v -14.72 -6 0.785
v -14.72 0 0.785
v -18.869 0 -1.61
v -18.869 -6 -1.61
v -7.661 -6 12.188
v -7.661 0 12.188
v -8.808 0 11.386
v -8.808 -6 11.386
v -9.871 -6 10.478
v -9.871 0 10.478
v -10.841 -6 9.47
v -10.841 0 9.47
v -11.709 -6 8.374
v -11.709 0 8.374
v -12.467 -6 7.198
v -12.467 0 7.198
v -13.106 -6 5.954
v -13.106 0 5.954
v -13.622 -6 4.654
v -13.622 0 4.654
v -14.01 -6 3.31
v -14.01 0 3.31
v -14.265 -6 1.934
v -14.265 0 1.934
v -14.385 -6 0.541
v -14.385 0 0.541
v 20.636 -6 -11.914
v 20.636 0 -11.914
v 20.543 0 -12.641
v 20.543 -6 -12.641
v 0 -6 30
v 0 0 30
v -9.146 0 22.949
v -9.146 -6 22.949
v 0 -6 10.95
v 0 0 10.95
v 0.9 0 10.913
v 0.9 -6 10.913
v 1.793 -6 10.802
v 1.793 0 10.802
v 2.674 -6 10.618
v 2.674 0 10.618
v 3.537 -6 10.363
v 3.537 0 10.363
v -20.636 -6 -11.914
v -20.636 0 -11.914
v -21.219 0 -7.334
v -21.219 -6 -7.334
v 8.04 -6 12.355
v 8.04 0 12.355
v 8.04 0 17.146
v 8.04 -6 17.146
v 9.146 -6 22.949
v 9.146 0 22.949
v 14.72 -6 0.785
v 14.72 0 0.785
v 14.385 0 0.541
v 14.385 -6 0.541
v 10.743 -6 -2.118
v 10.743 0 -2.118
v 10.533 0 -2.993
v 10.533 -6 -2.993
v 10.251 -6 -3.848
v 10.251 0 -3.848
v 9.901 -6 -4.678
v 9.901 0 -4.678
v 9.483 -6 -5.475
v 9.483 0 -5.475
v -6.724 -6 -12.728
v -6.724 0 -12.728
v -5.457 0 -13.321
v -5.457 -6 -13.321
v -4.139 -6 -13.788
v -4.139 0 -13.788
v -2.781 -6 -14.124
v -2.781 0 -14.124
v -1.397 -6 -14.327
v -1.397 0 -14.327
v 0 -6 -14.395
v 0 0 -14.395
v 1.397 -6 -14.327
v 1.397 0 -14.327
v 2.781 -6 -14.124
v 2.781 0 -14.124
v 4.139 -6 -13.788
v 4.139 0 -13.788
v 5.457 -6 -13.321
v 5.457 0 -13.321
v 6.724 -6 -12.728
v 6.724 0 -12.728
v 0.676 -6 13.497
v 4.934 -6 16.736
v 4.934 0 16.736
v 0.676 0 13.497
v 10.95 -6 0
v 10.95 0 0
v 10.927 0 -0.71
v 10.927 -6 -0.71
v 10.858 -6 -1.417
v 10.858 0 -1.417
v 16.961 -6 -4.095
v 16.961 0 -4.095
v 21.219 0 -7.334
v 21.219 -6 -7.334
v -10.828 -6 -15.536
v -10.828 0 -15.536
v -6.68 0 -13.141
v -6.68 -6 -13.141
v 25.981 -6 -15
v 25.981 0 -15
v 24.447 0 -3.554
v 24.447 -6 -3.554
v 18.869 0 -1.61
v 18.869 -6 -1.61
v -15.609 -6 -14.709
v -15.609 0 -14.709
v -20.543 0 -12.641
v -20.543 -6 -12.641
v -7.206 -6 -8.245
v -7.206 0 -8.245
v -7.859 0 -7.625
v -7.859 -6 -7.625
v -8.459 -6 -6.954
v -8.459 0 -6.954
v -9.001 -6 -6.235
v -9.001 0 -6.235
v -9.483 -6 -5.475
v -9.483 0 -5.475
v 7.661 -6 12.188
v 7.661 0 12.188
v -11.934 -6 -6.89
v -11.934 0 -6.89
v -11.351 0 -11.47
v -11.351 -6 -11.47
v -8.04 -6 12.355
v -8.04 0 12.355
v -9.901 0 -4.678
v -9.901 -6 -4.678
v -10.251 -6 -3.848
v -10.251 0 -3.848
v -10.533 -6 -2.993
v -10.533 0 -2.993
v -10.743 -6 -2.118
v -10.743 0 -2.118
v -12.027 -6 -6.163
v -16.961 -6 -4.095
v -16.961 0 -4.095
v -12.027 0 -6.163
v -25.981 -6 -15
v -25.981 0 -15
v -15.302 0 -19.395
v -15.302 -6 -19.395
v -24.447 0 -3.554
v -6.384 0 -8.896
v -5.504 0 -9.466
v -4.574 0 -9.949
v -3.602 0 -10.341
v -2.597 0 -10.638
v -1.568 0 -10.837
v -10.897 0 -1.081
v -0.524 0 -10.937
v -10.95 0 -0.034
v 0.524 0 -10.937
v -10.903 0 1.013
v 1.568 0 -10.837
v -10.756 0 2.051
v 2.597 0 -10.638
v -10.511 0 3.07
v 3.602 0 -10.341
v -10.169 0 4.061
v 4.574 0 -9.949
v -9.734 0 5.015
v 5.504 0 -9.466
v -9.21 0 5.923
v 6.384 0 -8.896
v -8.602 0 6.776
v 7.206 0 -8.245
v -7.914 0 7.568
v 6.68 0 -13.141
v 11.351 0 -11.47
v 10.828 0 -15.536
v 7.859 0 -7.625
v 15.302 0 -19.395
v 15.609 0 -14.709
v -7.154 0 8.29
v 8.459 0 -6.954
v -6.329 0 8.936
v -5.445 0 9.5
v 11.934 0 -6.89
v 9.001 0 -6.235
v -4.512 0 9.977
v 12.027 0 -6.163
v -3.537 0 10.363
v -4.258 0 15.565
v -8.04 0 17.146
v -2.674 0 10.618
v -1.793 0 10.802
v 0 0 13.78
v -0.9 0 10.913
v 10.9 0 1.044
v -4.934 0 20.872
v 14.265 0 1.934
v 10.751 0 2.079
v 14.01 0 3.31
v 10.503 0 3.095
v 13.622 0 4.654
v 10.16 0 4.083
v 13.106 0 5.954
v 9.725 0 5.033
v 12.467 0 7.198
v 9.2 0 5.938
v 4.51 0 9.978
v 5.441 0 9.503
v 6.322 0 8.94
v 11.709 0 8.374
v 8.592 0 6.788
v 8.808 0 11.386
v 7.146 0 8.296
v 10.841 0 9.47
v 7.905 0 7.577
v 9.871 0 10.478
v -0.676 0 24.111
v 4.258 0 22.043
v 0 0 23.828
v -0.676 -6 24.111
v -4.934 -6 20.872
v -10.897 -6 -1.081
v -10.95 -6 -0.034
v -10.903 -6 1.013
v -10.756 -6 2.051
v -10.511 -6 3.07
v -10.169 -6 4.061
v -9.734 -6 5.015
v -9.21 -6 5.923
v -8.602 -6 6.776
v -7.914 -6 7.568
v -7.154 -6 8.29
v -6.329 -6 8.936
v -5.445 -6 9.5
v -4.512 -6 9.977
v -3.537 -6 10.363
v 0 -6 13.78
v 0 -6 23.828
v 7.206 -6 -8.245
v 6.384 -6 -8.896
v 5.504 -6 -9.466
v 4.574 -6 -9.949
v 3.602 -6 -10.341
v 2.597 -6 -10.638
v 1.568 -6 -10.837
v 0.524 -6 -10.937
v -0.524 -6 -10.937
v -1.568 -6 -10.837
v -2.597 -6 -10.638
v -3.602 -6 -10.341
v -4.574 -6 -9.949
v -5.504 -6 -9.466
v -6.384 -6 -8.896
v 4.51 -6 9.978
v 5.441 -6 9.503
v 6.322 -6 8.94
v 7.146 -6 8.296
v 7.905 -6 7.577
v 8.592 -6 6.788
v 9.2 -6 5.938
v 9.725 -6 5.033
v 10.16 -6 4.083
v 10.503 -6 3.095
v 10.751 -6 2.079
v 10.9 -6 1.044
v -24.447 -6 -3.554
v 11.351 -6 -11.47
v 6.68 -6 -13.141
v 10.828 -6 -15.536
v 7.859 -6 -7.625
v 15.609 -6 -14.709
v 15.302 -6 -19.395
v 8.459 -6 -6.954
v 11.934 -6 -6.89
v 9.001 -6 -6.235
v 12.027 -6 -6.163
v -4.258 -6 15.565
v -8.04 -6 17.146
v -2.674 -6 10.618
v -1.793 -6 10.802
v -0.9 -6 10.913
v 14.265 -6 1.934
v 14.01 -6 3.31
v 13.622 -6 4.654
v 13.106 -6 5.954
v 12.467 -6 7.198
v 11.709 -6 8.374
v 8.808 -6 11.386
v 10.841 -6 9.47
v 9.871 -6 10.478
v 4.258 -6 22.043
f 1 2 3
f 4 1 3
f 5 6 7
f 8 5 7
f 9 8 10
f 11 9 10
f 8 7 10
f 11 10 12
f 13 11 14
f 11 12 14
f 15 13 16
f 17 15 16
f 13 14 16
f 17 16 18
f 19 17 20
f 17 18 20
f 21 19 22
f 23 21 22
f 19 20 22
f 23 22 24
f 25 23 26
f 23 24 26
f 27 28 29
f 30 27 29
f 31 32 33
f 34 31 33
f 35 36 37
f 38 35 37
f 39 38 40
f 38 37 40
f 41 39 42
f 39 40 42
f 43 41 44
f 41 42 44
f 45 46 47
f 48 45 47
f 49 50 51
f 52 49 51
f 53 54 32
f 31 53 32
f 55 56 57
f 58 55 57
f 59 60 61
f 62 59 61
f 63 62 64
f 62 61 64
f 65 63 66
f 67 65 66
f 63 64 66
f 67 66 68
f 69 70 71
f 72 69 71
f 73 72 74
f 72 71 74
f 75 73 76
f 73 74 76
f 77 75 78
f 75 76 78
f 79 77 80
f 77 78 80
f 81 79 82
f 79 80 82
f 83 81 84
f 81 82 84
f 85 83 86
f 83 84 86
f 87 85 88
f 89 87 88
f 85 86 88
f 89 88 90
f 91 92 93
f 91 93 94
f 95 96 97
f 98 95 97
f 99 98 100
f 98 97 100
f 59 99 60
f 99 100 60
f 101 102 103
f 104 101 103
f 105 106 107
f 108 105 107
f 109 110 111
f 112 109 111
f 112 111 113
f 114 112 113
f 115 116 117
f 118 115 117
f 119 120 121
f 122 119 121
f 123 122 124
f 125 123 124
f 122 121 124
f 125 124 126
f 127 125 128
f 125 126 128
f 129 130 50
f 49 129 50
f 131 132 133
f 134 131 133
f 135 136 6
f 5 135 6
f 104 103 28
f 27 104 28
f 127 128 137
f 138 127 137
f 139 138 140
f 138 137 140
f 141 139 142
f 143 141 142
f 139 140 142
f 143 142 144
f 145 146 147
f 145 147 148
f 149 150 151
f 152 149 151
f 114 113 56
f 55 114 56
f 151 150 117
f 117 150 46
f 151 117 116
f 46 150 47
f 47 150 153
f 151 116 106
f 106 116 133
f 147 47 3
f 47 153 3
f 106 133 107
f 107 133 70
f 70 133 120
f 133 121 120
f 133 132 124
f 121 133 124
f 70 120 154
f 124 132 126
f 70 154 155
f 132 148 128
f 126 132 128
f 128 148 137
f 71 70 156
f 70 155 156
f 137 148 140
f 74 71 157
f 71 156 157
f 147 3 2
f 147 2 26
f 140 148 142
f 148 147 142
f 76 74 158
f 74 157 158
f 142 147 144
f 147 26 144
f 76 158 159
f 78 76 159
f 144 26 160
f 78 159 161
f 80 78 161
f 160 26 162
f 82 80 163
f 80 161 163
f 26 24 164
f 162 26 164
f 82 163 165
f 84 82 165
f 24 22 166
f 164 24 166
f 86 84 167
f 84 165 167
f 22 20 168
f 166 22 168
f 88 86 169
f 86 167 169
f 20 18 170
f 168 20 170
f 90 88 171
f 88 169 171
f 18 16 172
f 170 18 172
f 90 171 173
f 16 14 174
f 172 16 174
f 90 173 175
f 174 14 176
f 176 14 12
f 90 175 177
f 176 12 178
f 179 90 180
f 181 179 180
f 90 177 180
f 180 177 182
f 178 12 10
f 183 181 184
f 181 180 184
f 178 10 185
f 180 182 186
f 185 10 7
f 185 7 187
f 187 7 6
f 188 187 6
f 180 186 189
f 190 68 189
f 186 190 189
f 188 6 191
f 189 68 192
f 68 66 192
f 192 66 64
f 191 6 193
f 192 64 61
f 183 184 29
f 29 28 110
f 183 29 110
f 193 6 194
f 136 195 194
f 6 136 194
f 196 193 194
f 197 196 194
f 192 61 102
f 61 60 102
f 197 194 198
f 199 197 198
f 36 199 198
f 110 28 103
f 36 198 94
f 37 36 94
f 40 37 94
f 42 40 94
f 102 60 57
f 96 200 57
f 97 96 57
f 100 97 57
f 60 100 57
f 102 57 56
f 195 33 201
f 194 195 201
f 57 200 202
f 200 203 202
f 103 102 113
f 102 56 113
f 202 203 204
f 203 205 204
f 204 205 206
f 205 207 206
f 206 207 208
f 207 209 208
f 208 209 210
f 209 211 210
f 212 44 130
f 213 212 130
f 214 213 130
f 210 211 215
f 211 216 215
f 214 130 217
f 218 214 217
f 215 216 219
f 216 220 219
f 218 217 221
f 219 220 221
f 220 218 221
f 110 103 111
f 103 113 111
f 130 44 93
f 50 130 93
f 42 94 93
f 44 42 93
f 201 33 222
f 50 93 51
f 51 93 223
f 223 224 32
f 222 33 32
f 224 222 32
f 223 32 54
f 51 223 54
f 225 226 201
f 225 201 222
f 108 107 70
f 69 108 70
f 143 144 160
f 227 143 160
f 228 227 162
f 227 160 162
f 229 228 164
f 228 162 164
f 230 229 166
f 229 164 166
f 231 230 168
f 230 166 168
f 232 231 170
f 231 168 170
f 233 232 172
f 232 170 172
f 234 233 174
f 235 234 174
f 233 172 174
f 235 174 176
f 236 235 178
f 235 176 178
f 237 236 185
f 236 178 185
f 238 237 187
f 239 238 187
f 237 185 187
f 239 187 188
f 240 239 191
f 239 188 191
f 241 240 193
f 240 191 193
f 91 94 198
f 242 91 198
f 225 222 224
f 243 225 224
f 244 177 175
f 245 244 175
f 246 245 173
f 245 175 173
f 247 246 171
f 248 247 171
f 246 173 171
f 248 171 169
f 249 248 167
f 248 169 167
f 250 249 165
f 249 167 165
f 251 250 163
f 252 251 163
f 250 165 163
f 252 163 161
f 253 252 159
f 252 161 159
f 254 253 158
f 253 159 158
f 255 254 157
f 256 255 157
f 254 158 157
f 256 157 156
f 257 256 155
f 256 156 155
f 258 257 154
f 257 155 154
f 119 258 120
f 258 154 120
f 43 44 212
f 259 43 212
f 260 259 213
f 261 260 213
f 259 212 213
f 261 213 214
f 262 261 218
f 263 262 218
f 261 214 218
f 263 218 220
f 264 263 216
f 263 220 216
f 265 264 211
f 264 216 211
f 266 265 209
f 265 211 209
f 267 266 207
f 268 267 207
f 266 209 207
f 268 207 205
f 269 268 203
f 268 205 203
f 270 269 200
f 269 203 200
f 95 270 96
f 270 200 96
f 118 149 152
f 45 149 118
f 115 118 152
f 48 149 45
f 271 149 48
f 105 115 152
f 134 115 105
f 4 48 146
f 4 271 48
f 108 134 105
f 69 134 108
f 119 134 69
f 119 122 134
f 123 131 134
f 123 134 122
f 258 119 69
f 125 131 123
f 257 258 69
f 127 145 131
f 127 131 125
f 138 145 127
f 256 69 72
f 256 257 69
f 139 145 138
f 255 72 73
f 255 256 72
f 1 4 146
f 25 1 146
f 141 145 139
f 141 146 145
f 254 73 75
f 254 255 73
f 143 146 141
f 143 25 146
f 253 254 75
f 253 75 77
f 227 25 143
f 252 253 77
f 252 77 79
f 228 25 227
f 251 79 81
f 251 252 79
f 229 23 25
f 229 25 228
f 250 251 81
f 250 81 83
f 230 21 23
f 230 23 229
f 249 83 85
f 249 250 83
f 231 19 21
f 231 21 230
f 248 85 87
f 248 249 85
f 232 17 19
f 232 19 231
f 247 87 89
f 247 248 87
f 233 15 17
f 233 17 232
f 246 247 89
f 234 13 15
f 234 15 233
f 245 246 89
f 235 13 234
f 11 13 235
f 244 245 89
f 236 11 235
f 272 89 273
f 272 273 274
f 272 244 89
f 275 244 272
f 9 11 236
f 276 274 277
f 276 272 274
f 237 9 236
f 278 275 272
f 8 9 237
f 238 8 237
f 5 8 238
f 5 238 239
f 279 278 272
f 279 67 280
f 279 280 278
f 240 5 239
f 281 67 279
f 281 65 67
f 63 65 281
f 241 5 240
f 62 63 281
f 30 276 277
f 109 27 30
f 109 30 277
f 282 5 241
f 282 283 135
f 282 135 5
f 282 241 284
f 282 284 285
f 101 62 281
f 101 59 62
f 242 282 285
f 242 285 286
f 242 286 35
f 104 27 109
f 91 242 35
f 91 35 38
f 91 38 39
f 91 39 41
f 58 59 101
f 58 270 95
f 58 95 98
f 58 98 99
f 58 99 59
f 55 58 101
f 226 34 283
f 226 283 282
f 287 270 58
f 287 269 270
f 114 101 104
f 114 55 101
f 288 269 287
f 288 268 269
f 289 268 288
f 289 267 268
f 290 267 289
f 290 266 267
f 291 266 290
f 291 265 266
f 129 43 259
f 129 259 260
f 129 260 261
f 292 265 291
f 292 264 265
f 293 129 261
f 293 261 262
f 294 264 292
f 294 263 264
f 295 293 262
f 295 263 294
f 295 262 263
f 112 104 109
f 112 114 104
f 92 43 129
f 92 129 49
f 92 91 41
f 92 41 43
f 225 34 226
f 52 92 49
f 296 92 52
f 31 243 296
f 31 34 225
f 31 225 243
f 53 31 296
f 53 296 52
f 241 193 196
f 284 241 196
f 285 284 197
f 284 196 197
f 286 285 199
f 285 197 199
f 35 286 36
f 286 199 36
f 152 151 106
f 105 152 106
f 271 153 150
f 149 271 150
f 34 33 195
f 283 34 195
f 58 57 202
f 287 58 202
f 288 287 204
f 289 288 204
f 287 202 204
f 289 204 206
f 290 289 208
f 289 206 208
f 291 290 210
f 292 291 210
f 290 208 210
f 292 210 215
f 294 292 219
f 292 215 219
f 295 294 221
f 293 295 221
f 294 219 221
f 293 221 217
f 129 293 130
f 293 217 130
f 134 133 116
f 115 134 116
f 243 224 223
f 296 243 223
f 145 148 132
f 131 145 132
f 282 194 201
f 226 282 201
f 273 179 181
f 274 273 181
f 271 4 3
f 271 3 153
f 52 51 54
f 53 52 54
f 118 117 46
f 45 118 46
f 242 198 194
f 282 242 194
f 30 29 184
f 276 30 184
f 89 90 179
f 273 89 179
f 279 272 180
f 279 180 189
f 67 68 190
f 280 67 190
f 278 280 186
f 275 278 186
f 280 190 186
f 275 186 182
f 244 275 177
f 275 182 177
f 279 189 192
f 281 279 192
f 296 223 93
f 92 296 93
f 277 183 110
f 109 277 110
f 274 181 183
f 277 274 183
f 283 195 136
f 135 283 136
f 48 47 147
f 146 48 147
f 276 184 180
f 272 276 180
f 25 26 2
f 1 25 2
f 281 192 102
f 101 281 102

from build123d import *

# Parameters (mm, degrees)
F1_DEPTH = 6


with BuildPart() as f1:
    # F0 (on Front) → F1 (new body)
    with BuildSketch(Plane.XZ):
        with BuildLine():
            ThreePointArc((-10.743231, -2.117897), (-9.482978, 5.475), (-3.537462, 10.36286))
            Line((-3.537462, 10.36286), (-7.660854, 12.187504))
            ThreePointArc((-7.660854, 12.187504), (-12.466674, 7.197638), (-14.385115, 0.540742))
            Line((-14.385115, 0.540742), (-10.743231, -2.117897))
        make_face()
        with BuildLine():
            ThreePointArc((-9.482978, -5.475), (-10.251459, -3.848387), (-10.743231, -2.117897))
            Line((-10.743231, -2.117897), (-14.385115, 0.540742))
            Line((-14.385115, 0.540742), (-14.720386, 0.785496))
            Line((-14.720386, 0.785496), (-18.868808, -1.609597))
            Line((-18.868808, -1.609597), (-24.447452, -3.553989))
            Line((-24.447452, -3.553989), (-25.980762, -15))
            Line((-25.980762, -15), (-20.635515, -11.91392))
            Line((-20.635515, -11.91392), (-21.219079, -7.334182))
            Line((-21.219079, -7.334182), (-16.961128, -4.094992))
            Line((-16.961128, -4.094992), (-12.026931, -6.162892))
            Line((-12.026931, -6.162892), (-11.93425, -6.890243))
            Line((-11.93425, -6.890243), (-9.482978, -5.475))
        make_face()
        with BuildLine():
            ThreePointArc((-7.205768, -8.244962), (-8.458531, -6.953831), (-9.482978, -5.475))
            Line((-9.482978, -5.475), (-11.93425, -6.890243))
            Line((-11.93425, -6.890243), (-11.350686, -11.469981))
            Line((-11.350686, -11.469981), (-15.608638, -14.70917))
            Line((-15.608638, -14.70917), (-20.542834, -12.641271))
            Line((-20.542834, -12.641271), (-20.635515, -11.91392))
            Line((-20.635515, -11.91392), (-25.980762, -15))
            Line((-25.980762, -15), (-15.301571, -19.39512))
            Line((-15.301571, -19.39512), (-10.828356, -15.536069))
            Line((-10.828356, -15.536069), (-6.679934, -13.140976))
            Line((-6.679934, -13.140976), (-6.724261, -12.728246))
            Line((-6.724261, -12.728246), (-7.205768, -8.244962))
        make_face()
        with BuildLine():
            Line((6.724261, -12.728246), (7.205768, -8.244962))
            ThreePointArc((7.205768, -8.244962), (0, -10.95), (-7.205768, -8.244962))
            Line((-7.205768, -8.244962), (-6.724261, -12.728246))
            ThreePointArc((-6.724261, -12.728246), (0, -14.395275), (6.724261, -12.728246))
        make_face()
        with BuildLine():
            Line((11.93425, -6.890243), (9.482978, -5.475))
            ThreePointArc((9.482978, -5.475), (8.458531, -6.953831), (7.205768, -8.244962))
            Line((7.205768, -8.244962), (6.724261, -12.728246))
            Line((6.724261, -12.728246), (6.679934, -13.140976))
            Line((6.679934, -13.140976), (10.828356, -15.536069))
            Line((10.828356, -15.536069), (15.301571, -19.39512))
            Line((15.301571, -19.39512), (25.980762, -15))
            Line((25.980762, -15), (20.635515, -11.91392))
            Line((20.635515, -11.91392), (20.542834, -12.641271))
            Line((20.542834, -12.641271), (15.608638, -14.70917))
            Line((15.608638, -14.70917), (11.350686, -11.469981))
            Line((11.350686, -11.469981), (11.93425, -6.890243))
        make_face()
        with BuildLine():
            Line((14.385115, 0.540742), (10.743231, -2.117897))
            ThreePointArc((10.743231, -2.117897), (10.251459, -3.848387), (9.482978, -5.475))
            Line((9.482978, -5.475), (11.93425, -6.890243))
            Line((11.93425, -6.890243), (12.026931, -6.162892))
            Line((12.026931, -6.162892), (16.961128, -4.094992))
            Line((16.961128, -4.094992), (21.219079, -7.334182))
            Line((21.219079, -7.334182), (20.635515, -11.91392))
            Line((20.635515, -11.91392), (25.980762, -15))
            Line((25.980762, -15), (24.447452, -3.553989))
            Line((24.447452, -3.553989), (18.868808, -1.609597))
            Line((18.868808, -1.609597), (14.720386, 0.785496))
            Line((14.720386, 0.785496), (14.385115, 0.540742))
        make_face()
        with BuildLine():
            ThreePointArc((3.537462, 10.36286), (8.906113, 6.370529), (10.95, 0))
            ThreePointArc((10.95, 0), (10.898185, -1.063983), (10.743231, -2.117897))
            Line((10.743231, -2.117897), (14.385115, 0.540742))
            ThreePointArc((14.385115, 0.540742), (12.466674, 7.197638), (7.660854, 12.187504))
            Line((7.660854, 12.187504), (3.537462, 10.36286))
        make_face()
        with BuildLine():
            ThreePointArc((0, 10.95), (1.792929, 10.802218), (3.537462, 10.36286))
            Line((3.537462, 10.36286), (7.660854, 12.187504))
            Line((7.660854, 12.187504), (8.040452, 12.35548))
            Line((8.040452, 12.35548), (8.040452, 17.145665))
            Line((8.040452, 17.145665), (9.145881, 22.949109))
            Line((9.145881, 22.949109), (0, 30))
            Line((0, 30), (0, 23.82784))
            Line((0, 23.82784), (4.257951, 22.043353))
            Line((4.257951, 22.043353), (4.934196, 16.736264))
            Line((4.934196, 16.736264), (0.676245, 13.497074))
            Line((0.676245, 13.497074), (0, 13.780485))
            Line((0, 13.780485), (0, 10.95))
        make_face()
        with BuildLine():
            ThreePointArc((-3.537462, 10.36286), (-1.792929, 10.802218), (0, 10.95))
            Line((0, 10.95), (0, 13.780485))
            Line((0, 13.780485), (-4.257951, 15.564973))
            Line((-4.257951, 15.564973), (-4.934196, 20.872062))
            Line((-4.934196, 20.872062), (-0.676245, 24.111252))
            Line((-0.676245, 24.111252), (0, 23.82784))
            Line((0, 23.82784), (0, 30))
            Line((0, 30), (-9.145881, 22.949109))
            Line((-9.145881, 22.949109), (-8.040452, 17.145665))
            Line((-8.040452, 17.145665), (-8.040452, 12.35548))
            Line((-8.040452, 12.35548), (-7.660854, 12.187504))
            Line((-7.660854, 12.187504), (-3.537462, 10.36286))
        make_face()
    extrude(amount=F1_DEPTH)


solid = f1.part
